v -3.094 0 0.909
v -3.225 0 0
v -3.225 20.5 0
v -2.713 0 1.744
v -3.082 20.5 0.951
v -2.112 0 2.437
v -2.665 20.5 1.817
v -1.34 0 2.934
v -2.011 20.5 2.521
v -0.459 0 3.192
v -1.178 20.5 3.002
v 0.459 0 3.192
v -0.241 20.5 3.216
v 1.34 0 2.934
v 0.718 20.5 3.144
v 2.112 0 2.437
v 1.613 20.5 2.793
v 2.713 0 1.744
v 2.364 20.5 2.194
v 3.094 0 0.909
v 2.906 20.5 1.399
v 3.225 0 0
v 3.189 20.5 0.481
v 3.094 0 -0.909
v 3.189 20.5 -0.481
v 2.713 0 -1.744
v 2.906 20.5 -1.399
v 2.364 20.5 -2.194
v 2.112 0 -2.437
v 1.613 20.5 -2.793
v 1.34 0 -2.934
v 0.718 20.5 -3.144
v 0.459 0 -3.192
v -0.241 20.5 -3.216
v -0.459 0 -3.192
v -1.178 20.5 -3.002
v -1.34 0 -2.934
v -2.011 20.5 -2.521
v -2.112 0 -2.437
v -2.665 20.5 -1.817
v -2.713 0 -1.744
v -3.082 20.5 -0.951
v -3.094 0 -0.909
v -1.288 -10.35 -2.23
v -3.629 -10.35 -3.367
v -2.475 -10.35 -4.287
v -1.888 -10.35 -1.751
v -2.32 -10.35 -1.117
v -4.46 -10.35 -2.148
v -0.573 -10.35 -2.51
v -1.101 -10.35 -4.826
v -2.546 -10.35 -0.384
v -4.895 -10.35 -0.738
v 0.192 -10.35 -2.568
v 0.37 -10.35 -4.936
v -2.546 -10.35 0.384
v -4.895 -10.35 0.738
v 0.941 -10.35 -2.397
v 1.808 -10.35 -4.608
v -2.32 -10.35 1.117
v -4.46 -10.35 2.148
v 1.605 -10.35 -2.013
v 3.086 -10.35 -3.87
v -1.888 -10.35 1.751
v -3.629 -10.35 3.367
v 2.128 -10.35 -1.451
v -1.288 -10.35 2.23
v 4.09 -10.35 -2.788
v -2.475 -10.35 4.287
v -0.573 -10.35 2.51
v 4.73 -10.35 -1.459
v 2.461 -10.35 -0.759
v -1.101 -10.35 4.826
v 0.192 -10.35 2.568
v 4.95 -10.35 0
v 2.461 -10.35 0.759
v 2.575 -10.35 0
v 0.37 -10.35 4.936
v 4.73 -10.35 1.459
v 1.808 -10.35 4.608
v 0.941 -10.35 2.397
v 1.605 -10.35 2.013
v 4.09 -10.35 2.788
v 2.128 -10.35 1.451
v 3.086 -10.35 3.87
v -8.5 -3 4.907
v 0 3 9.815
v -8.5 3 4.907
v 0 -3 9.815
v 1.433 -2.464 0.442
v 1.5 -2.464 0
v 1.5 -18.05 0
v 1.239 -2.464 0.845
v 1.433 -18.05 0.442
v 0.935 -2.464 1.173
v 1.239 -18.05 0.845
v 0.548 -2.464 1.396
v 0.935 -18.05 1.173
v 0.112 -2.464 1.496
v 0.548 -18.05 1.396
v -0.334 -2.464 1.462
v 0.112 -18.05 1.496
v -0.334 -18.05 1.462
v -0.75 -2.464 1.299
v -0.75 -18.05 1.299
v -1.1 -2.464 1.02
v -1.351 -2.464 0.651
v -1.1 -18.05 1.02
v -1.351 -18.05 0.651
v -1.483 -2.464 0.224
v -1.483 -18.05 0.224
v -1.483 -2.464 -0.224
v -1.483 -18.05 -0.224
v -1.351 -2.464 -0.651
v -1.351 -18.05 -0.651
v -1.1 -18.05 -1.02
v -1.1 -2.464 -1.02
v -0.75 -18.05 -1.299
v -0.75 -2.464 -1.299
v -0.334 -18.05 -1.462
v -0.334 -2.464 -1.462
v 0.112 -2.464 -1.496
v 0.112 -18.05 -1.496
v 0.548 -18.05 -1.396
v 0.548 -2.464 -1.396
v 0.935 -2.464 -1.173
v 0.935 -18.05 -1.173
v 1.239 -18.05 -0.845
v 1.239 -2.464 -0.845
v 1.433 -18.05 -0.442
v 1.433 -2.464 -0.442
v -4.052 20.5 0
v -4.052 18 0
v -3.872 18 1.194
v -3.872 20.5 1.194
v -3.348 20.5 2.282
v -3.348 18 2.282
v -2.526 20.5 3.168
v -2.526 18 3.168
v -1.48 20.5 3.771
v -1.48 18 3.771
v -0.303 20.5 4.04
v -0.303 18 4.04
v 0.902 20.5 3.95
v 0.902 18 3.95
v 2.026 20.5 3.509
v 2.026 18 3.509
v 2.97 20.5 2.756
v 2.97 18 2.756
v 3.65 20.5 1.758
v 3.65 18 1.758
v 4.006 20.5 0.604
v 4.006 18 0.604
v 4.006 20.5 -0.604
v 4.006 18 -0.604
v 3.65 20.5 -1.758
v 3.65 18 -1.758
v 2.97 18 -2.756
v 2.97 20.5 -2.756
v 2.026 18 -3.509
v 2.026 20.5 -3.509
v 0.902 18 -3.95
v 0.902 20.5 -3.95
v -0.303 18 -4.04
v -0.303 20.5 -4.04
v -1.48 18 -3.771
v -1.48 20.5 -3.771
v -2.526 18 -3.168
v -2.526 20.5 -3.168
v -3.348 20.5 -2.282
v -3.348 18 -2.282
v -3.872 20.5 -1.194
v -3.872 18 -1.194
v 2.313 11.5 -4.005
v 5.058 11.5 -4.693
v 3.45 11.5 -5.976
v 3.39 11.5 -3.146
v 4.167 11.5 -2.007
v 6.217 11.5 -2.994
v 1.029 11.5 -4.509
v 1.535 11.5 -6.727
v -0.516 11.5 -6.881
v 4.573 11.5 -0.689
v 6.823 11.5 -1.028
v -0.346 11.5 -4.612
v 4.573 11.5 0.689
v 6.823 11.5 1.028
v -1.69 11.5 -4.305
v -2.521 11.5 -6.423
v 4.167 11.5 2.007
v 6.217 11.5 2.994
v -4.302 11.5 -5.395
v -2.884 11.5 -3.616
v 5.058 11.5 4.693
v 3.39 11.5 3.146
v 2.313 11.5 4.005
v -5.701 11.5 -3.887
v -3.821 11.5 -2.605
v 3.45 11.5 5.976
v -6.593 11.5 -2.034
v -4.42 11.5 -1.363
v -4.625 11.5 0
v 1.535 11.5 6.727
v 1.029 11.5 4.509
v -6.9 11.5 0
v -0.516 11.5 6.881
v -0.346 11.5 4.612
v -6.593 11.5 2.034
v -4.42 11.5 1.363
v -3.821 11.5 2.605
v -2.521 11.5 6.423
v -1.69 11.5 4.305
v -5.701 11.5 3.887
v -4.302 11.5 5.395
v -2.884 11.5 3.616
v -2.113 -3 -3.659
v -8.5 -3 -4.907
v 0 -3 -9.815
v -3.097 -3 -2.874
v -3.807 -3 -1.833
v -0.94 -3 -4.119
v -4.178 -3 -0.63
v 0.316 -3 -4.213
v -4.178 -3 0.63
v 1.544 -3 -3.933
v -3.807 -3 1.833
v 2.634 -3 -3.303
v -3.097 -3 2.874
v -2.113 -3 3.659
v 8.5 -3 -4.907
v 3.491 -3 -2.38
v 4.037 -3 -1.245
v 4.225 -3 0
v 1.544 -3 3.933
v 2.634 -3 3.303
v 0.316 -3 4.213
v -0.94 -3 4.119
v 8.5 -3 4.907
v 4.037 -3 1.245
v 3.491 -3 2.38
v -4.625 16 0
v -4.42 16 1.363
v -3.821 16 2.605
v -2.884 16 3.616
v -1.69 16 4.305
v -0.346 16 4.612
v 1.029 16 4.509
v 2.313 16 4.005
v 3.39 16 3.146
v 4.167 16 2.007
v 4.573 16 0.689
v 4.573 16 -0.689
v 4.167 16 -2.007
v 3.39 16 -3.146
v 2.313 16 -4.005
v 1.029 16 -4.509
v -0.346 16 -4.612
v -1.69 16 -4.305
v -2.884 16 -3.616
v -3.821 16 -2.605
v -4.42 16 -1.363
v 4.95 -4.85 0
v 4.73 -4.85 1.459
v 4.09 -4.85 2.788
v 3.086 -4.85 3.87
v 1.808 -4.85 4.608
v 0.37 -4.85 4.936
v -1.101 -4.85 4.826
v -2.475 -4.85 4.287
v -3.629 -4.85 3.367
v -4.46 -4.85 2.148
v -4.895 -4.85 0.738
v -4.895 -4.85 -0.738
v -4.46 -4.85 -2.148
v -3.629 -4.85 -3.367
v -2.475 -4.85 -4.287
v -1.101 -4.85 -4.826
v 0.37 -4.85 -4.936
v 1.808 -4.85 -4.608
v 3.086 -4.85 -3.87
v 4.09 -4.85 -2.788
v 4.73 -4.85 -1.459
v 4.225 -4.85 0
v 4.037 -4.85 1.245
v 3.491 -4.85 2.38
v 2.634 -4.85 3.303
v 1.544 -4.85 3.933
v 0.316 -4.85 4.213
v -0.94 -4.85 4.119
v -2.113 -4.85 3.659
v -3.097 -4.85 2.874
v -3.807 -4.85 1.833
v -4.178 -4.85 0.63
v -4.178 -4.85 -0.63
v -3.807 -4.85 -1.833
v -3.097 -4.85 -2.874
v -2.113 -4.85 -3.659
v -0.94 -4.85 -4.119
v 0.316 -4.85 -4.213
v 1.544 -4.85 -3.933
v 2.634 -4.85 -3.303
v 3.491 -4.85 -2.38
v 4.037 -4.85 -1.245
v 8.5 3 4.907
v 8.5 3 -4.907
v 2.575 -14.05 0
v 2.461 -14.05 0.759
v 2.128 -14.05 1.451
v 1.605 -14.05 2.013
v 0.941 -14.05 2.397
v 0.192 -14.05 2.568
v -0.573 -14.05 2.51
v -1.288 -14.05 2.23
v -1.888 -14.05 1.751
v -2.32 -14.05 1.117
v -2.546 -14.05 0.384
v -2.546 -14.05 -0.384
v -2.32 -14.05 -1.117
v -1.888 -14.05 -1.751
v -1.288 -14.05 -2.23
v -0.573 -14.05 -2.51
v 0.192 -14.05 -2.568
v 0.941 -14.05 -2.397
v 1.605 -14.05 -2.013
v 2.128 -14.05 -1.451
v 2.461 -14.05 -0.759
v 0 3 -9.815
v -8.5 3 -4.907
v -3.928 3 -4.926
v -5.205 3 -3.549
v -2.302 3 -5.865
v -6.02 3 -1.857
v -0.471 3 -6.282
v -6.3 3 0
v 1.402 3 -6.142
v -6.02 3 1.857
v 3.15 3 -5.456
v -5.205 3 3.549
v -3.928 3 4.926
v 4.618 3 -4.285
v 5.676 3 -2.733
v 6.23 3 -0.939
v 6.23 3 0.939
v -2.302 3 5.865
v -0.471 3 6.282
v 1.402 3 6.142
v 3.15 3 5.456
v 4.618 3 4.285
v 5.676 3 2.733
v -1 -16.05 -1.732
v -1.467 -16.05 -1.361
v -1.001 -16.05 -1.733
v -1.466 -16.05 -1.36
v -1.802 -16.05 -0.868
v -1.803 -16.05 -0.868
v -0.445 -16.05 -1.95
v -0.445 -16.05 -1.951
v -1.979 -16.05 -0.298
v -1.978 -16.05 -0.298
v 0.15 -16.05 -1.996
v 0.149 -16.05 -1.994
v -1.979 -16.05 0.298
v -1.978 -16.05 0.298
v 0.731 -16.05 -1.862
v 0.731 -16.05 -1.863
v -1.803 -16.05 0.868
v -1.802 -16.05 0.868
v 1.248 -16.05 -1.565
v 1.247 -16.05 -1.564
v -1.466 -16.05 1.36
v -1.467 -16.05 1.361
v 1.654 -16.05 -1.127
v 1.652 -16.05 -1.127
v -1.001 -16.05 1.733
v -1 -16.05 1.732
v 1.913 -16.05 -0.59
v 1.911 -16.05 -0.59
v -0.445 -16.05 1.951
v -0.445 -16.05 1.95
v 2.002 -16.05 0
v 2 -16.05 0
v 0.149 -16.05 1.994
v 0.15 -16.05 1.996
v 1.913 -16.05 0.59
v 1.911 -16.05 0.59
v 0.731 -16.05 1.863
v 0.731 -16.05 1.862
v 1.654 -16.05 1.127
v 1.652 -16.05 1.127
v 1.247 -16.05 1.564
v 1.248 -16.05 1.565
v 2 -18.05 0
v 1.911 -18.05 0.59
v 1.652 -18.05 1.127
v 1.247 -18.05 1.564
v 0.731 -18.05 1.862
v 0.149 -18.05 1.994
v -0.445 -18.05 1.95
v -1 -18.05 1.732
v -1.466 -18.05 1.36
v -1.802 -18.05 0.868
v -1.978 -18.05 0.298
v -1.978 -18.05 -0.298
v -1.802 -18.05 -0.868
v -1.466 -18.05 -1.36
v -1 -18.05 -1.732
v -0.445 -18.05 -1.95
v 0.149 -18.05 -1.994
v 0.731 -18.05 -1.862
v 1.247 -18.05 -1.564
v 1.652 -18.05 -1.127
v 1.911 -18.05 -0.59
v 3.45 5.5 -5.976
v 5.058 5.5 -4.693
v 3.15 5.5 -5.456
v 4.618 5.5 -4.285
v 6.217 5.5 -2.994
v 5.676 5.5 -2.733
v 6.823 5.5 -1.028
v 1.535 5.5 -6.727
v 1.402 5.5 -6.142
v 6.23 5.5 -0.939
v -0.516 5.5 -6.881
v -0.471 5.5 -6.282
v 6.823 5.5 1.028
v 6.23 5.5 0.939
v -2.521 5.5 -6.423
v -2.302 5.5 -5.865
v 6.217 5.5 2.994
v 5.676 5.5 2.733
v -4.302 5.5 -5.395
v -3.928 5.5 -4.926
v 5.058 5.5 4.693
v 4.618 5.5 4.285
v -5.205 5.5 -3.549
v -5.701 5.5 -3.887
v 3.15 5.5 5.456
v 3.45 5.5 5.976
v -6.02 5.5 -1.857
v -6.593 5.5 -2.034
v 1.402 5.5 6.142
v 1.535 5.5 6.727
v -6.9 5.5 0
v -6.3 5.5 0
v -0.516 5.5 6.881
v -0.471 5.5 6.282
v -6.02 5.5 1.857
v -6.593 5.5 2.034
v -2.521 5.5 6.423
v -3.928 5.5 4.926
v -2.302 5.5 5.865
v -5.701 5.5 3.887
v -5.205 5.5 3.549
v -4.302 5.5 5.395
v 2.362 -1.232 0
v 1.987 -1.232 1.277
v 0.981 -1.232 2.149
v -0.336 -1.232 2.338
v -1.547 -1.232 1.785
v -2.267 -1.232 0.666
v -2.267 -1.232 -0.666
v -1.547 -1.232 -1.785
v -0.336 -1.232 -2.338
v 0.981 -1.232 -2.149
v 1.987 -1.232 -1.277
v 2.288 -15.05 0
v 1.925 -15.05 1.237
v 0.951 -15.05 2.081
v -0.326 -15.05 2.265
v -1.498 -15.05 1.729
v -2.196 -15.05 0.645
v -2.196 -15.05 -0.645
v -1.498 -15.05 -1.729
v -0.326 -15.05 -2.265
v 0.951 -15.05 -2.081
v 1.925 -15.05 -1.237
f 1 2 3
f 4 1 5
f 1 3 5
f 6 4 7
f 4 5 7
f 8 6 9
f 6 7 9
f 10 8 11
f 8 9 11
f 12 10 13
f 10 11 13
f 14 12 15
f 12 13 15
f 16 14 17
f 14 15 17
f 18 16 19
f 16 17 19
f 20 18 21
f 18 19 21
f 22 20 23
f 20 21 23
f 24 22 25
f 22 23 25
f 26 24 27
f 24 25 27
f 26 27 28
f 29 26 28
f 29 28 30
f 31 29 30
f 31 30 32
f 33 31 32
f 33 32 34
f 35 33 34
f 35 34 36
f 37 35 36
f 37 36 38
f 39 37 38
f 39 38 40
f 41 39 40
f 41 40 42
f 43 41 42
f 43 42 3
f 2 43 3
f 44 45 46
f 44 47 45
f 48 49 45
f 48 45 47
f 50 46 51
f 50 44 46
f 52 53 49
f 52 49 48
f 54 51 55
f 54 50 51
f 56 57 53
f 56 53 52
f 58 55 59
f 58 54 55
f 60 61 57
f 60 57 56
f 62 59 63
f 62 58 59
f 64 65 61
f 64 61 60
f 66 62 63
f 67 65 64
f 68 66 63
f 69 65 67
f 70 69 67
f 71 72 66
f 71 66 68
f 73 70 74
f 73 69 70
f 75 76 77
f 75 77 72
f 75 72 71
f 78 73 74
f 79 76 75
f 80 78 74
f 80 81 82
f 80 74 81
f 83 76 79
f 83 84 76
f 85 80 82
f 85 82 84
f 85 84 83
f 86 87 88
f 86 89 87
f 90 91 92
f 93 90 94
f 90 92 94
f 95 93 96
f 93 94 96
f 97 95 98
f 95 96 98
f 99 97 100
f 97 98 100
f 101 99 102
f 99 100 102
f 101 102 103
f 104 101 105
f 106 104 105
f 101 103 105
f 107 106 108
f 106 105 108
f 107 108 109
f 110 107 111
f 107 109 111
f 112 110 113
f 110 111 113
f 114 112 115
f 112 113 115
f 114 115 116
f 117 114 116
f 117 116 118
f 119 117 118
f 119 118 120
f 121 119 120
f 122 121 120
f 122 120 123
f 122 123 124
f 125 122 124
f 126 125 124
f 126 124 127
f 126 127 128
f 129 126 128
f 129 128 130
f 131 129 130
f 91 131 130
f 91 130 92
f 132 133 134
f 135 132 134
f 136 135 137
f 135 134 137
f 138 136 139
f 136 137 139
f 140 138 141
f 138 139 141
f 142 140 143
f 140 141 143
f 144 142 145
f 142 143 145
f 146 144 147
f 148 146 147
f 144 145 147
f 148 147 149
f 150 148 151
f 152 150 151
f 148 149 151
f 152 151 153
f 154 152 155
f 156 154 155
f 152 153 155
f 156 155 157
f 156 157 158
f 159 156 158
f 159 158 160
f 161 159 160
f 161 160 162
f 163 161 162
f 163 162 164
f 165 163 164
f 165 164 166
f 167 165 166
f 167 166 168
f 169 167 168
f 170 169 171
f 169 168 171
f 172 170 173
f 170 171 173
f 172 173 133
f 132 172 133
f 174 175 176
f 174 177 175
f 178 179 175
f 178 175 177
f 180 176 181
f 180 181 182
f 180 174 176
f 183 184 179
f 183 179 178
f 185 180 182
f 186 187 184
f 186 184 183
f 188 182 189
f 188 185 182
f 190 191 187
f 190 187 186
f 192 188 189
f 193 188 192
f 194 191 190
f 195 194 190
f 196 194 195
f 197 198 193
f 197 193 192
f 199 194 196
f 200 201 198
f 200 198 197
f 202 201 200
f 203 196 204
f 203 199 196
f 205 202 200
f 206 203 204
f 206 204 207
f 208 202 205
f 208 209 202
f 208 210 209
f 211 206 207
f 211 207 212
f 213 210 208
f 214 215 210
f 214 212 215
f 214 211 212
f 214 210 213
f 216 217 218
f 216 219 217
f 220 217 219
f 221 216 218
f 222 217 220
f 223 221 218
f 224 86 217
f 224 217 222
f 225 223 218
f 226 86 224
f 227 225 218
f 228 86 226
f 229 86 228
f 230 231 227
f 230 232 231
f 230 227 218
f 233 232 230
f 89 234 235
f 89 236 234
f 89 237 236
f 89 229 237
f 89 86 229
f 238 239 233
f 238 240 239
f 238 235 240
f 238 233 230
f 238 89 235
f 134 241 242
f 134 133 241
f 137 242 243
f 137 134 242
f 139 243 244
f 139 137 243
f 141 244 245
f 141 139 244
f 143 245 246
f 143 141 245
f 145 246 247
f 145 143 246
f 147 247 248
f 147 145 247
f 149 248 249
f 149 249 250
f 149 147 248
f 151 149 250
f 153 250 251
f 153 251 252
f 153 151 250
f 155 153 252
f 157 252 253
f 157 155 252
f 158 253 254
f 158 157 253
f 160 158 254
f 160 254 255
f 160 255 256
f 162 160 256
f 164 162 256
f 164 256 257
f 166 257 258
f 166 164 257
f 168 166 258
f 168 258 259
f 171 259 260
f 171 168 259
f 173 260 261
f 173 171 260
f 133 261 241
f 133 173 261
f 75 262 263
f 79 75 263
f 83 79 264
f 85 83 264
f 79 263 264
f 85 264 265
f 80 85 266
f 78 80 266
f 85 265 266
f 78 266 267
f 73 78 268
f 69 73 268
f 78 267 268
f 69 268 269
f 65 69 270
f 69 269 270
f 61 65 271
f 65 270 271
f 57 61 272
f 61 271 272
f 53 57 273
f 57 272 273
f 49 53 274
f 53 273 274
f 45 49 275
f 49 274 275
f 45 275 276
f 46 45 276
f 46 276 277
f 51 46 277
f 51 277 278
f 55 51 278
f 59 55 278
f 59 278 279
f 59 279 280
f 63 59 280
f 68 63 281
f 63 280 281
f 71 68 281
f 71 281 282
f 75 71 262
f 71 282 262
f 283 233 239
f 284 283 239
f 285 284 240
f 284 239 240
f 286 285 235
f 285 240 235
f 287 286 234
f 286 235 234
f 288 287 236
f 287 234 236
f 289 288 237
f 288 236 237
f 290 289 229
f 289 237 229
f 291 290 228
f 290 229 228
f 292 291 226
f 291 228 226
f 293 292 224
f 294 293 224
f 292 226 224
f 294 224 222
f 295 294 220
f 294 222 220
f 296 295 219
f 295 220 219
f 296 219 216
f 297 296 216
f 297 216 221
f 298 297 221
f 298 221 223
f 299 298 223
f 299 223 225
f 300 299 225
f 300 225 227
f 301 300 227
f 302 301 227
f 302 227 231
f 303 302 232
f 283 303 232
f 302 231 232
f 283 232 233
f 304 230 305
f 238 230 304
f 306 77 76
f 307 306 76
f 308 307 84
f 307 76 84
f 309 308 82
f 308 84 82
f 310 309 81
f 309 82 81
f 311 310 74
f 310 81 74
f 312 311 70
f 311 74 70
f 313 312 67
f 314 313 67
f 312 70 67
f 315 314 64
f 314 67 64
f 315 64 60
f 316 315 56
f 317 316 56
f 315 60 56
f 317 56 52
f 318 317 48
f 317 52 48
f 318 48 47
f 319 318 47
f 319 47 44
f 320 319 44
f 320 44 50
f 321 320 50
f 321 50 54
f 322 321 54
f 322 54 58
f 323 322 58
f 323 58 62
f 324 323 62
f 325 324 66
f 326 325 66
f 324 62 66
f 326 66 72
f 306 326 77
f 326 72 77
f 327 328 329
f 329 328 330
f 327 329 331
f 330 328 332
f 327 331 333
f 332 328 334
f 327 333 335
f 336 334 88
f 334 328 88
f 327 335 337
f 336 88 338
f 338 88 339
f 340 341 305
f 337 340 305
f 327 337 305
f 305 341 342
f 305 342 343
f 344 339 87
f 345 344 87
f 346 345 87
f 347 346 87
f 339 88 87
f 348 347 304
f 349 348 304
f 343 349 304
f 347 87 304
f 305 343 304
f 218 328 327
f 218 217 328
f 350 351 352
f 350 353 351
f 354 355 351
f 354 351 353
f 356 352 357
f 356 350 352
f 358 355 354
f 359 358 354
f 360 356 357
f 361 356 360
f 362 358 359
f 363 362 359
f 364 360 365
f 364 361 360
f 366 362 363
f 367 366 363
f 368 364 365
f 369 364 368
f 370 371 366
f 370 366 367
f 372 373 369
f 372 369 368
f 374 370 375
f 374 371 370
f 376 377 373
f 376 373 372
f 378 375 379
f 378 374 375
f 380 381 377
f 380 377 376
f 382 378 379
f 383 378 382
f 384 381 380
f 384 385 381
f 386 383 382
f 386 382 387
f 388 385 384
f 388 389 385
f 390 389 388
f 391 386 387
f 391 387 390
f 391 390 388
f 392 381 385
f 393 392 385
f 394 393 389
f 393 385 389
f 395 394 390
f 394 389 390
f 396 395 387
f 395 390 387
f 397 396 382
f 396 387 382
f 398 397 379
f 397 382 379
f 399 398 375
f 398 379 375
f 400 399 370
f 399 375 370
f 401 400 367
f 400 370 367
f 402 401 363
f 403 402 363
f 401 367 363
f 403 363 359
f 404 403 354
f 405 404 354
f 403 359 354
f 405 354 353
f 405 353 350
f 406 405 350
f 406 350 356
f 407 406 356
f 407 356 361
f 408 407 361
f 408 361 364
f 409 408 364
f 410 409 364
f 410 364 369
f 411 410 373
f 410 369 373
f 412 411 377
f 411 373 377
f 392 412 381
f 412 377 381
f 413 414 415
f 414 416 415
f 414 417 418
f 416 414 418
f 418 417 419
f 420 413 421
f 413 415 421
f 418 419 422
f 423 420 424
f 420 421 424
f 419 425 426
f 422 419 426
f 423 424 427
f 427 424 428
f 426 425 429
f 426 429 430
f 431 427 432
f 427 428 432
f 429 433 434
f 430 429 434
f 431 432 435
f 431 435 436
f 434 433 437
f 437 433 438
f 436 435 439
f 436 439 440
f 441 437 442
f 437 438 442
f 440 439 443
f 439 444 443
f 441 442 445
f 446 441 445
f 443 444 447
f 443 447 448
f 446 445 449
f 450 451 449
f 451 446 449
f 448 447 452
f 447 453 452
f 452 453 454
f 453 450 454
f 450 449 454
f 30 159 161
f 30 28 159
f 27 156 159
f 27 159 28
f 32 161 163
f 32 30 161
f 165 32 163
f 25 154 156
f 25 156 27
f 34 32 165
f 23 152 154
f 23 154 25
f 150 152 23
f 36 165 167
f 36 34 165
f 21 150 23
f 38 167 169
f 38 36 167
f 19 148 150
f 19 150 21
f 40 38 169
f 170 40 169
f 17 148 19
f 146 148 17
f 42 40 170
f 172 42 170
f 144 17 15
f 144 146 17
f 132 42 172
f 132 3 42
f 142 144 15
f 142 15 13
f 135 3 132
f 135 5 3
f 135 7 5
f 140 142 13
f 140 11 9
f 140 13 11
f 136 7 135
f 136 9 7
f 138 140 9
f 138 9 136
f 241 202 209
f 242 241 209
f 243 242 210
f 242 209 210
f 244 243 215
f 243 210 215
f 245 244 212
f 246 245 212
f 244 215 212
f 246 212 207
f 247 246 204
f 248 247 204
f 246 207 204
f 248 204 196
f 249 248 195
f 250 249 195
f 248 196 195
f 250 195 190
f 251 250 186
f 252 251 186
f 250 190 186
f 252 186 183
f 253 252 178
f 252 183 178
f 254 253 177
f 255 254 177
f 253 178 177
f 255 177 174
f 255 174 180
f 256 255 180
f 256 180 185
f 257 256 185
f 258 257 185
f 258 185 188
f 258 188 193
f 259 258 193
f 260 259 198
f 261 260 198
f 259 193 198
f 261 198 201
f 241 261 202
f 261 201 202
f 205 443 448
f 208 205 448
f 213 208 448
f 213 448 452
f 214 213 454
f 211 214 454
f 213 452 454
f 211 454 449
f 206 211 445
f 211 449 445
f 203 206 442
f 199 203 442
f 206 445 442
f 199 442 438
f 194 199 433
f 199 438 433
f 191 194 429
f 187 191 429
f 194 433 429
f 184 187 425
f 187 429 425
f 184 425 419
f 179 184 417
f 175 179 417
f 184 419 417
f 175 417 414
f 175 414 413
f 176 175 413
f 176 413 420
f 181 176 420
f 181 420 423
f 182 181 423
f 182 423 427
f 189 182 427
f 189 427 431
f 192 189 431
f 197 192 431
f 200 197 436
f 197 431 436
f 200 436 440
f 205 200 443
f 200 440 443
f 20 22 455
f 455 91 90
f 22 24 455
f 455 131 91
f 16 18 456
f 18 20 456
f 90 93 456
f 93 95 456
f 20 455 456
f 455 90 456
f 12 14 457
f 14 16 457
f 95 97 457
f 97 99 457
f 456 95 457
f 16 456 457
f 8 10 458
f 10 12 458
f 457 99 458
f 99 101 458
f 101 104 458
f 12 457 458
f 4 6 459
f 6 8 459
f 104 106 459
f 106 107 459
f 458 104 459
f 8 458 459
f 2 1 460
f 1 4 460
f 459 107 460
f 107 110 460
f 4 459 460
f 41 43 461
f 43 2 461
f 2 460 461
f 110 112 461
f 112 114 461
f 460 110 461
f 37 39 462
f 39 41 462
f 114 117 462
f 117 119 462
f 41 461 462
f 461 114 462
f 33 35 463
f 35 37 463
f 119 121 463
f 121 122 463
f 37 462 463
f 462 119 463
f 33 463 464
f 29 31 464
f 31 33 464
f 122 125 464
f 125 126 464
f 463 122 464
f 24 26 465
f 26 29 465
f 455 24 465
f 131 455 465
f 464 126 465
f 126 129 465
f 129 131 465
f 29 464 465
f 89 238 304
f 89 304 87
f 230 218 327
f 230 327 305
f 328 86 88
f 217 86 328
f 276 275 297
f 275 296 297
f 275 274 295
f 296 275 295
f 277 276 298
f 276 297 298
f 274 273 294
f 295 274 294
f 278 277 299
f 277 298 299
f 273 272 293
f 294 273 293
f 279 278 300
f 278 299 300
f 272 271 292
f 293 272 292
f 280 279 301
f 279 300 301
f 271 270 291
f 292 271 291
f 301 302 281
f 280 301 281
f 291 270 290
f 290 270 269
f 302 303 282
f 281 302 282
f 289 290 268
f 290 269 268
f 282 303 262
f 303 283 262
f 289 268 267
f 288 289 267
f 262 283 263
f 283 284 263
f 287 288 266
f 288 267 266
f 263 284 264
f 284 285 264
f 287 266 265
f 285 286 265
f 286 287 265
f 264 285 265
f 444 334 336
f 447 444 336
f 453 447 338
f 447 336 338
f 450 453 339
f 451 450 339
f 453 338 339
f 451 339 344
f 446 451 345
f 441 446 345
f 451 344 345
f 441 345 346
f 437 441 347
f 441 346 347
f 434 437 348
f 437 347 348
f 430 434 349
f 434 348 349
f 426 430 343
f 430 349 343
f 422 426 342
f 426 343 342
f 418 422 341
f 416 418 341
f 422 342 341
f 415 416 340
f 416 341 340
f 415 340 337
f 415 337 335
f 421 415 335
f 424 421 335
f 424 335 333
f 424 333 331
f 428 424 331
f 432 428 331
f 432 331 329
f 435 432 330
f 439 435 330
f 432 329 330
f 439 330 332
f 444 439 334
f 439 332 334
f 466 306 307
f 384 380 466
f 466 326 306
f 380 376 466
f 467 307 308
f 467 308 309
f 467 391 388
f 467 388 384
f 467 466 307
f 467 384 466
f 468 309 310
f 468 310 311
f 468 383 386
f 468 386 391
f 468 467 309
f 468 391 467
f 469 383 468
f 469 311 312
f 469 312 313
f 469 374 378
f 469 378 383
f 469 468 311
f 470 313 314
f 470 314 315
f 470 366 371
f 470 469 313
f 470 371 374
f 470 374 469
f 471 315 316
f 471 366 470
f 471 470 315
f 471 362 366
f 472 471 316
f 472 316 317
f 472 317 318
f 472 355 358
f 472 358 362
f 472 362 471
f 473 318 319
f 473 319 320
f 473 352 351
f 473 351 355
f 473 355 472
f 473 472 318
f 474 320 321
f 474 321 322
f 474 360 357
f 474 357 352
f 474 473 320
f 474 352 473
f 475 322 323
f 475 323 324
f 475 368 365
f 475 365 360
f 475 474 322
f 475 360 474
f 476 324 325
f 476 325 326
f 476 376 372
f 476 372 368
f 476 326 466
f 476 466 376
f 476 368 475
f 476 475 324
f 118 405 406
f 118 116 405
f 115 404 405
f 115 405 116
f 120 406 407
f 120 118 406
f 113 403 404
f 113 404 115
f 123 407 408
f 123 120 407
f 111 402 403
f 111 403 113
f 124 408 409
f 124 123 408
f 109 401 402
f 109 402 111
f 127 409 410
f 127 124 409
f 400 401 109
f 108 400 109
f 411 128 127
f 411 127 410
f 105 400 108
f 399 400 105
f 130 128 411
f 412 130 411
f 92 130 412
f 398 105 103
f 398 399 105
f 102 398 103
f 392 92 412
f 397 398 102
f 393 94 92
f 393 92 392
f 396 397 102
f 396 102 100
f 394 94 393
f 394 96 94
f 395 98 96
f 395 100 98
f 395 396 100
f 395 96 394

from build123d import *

# Parameters (mm, degrees)
F1_DEPTH  = 3
F2_R      = 6.3
F3_DEPTH  = 2.5
F4_R      = 6.9
F5_DEPTH  = 6
F6_R      = 4.625
F7_DEPTH  = 4.5
F8_R      = 4.625
F9_DEPTH  = 2
F9_TAPER  = 16
F10_R     = 4.0515092285
F10_R_2   = 4
F11_DEPTH = 2.5
F12_R     = 3.225
F13_DEPTH = 20.5
F14_R     = 4.225
F15_DEPTH = 1.85
F16_R     = 4.95
F17_DEPTH = 5.5
F18_R     = 2.575
F19_DEPTH = 3.7
F20_R     = 2.575
F21_DEPTH = 2
F21_TAPER = 16
F22_R     = 2
F23_DEPTH = 2
F24_R     = 1.5
F25_DEPTH = 18.05
F26_R     = 3.225
F27_DEPTH = 3.5
F27_TAPER = 35


with BuildPart() as f1:
    # F0 (on Front) → F1 (new body, symmetric)
    with BuildSketch(Plane.XZ):
        Polygon((-8.5, -4.9074772881), (0, -9.8149545762), (8.5, -4.9074772881), (8.5, 4.9074772881), (0, 9.8149545762), (-8.5, 4.9074772881), align=None)
    extrude(amount=F1_DEPTH, both=True)

    # F2 (on face) → F3 (join)
    with BuildSketch(Plane(origin=(0, 3, 0), x_dir=(-1, 0, 0), z_dir=(0, 1, 0))):
        Circle(F2_R)
    extrude(amount=F3_DEPTH)

    # F4 (on face) → F5 (join)
    with BuildSketch(Plane(origin=(0, 5.5, 0), x_dir=(-1, 0, 0), z_dir=(0, 1, 0))):
        Circle(F4_R)
    extrude(amount=F5_DEPTH)

    # F6 (on face) → F7 (join)
    with BuildSketch(Plane(origin=(0, 11.5, 0), x_dir=(-1, 0, 0), z_dir=(0, 1, 0))):
        Circle(F6_R)
    extrude(amount=F7_DEPTH)

    # F8 (on face) → F9 (join)
    with BuildSketch(Plane(origin=(0, 16, 0), x_dir=(-1, 0, 0), z_dir=(0, 1, 0))):
        Circle(F8_R)
    extrude(amount=F9_DEPTH, taper=F9_TAPER)

    # F10 (on face) → F11 (join)
    with BuildSketch(Plane(origin=(0, 18, 0), x_dir=(-1, 0, 0), z_dir=(0, 1, 0))):
        Circle(F10_R)
        Circle(F10_R_2, mode=Mode.SUBTRACT)
        Circle(F10_R_2)
    extrude(amount=F11_DEPTH)

    # F12 (on face) → F13 (cut, through all)
    with BuildSketch(Plane(origin=(0, 20.5, 0), x_dir=(-1, 0, 0), z_dir=(0, 1, 0))):
        Circle(F12_R)
    extrude(amount=-F13_DEPTH, mode=Mode.SUBTRACT)

    # F14 (on face) → F15 (join)
    with BuildSketch(Plane.XZ.offset(3)):
        Circle(F14_R)
    extrude(amount=F15_DEPTH)

    # F16 (on face) → F17 (join)
    with BuildSketch(Plane.XZ.offset(4.85)):
        Circle(F16_R)
    extrude(amount=F17_DEPTH)

    # F18 (on face) → F19 (join)
    with BuildSketch(Plane.XZ.offset(10.35)):
        Circle(F18_R)
    extrude(amount=F19_DEPTH)

    # F20 (on face) → F21 (join)
    with BuildSketch(Plane.XZ.offset(14.05)):
        Circle(F20_R)
    extrude(amount=F21_DEPTH, taper=F21_TAPER)

    # F22 (on face) → F23 (join)
    with BuildSketch(Plane.XZ.offset(16.05)):
        Circle(F22_R)
    extrude(amount=F23_DEPTH)

    # F24 (on face) → F25 (cut, through all)
    with BuildSketch(Plane.XZ.offset(18.05)):
        Circle(F24_R)
    extrude(amount=-F25_DEPTH, mode=Mode.SUBTRACT)

    # F26 (on Front) → F27 (cut)
    with BuildSketch(Plane.XZ):
        Circle(F26_R)
    extrude(amount=F27_DEPTH, taper=F27_TAPER, mode=Mode.SUBTRACT)


solid = f1.part
